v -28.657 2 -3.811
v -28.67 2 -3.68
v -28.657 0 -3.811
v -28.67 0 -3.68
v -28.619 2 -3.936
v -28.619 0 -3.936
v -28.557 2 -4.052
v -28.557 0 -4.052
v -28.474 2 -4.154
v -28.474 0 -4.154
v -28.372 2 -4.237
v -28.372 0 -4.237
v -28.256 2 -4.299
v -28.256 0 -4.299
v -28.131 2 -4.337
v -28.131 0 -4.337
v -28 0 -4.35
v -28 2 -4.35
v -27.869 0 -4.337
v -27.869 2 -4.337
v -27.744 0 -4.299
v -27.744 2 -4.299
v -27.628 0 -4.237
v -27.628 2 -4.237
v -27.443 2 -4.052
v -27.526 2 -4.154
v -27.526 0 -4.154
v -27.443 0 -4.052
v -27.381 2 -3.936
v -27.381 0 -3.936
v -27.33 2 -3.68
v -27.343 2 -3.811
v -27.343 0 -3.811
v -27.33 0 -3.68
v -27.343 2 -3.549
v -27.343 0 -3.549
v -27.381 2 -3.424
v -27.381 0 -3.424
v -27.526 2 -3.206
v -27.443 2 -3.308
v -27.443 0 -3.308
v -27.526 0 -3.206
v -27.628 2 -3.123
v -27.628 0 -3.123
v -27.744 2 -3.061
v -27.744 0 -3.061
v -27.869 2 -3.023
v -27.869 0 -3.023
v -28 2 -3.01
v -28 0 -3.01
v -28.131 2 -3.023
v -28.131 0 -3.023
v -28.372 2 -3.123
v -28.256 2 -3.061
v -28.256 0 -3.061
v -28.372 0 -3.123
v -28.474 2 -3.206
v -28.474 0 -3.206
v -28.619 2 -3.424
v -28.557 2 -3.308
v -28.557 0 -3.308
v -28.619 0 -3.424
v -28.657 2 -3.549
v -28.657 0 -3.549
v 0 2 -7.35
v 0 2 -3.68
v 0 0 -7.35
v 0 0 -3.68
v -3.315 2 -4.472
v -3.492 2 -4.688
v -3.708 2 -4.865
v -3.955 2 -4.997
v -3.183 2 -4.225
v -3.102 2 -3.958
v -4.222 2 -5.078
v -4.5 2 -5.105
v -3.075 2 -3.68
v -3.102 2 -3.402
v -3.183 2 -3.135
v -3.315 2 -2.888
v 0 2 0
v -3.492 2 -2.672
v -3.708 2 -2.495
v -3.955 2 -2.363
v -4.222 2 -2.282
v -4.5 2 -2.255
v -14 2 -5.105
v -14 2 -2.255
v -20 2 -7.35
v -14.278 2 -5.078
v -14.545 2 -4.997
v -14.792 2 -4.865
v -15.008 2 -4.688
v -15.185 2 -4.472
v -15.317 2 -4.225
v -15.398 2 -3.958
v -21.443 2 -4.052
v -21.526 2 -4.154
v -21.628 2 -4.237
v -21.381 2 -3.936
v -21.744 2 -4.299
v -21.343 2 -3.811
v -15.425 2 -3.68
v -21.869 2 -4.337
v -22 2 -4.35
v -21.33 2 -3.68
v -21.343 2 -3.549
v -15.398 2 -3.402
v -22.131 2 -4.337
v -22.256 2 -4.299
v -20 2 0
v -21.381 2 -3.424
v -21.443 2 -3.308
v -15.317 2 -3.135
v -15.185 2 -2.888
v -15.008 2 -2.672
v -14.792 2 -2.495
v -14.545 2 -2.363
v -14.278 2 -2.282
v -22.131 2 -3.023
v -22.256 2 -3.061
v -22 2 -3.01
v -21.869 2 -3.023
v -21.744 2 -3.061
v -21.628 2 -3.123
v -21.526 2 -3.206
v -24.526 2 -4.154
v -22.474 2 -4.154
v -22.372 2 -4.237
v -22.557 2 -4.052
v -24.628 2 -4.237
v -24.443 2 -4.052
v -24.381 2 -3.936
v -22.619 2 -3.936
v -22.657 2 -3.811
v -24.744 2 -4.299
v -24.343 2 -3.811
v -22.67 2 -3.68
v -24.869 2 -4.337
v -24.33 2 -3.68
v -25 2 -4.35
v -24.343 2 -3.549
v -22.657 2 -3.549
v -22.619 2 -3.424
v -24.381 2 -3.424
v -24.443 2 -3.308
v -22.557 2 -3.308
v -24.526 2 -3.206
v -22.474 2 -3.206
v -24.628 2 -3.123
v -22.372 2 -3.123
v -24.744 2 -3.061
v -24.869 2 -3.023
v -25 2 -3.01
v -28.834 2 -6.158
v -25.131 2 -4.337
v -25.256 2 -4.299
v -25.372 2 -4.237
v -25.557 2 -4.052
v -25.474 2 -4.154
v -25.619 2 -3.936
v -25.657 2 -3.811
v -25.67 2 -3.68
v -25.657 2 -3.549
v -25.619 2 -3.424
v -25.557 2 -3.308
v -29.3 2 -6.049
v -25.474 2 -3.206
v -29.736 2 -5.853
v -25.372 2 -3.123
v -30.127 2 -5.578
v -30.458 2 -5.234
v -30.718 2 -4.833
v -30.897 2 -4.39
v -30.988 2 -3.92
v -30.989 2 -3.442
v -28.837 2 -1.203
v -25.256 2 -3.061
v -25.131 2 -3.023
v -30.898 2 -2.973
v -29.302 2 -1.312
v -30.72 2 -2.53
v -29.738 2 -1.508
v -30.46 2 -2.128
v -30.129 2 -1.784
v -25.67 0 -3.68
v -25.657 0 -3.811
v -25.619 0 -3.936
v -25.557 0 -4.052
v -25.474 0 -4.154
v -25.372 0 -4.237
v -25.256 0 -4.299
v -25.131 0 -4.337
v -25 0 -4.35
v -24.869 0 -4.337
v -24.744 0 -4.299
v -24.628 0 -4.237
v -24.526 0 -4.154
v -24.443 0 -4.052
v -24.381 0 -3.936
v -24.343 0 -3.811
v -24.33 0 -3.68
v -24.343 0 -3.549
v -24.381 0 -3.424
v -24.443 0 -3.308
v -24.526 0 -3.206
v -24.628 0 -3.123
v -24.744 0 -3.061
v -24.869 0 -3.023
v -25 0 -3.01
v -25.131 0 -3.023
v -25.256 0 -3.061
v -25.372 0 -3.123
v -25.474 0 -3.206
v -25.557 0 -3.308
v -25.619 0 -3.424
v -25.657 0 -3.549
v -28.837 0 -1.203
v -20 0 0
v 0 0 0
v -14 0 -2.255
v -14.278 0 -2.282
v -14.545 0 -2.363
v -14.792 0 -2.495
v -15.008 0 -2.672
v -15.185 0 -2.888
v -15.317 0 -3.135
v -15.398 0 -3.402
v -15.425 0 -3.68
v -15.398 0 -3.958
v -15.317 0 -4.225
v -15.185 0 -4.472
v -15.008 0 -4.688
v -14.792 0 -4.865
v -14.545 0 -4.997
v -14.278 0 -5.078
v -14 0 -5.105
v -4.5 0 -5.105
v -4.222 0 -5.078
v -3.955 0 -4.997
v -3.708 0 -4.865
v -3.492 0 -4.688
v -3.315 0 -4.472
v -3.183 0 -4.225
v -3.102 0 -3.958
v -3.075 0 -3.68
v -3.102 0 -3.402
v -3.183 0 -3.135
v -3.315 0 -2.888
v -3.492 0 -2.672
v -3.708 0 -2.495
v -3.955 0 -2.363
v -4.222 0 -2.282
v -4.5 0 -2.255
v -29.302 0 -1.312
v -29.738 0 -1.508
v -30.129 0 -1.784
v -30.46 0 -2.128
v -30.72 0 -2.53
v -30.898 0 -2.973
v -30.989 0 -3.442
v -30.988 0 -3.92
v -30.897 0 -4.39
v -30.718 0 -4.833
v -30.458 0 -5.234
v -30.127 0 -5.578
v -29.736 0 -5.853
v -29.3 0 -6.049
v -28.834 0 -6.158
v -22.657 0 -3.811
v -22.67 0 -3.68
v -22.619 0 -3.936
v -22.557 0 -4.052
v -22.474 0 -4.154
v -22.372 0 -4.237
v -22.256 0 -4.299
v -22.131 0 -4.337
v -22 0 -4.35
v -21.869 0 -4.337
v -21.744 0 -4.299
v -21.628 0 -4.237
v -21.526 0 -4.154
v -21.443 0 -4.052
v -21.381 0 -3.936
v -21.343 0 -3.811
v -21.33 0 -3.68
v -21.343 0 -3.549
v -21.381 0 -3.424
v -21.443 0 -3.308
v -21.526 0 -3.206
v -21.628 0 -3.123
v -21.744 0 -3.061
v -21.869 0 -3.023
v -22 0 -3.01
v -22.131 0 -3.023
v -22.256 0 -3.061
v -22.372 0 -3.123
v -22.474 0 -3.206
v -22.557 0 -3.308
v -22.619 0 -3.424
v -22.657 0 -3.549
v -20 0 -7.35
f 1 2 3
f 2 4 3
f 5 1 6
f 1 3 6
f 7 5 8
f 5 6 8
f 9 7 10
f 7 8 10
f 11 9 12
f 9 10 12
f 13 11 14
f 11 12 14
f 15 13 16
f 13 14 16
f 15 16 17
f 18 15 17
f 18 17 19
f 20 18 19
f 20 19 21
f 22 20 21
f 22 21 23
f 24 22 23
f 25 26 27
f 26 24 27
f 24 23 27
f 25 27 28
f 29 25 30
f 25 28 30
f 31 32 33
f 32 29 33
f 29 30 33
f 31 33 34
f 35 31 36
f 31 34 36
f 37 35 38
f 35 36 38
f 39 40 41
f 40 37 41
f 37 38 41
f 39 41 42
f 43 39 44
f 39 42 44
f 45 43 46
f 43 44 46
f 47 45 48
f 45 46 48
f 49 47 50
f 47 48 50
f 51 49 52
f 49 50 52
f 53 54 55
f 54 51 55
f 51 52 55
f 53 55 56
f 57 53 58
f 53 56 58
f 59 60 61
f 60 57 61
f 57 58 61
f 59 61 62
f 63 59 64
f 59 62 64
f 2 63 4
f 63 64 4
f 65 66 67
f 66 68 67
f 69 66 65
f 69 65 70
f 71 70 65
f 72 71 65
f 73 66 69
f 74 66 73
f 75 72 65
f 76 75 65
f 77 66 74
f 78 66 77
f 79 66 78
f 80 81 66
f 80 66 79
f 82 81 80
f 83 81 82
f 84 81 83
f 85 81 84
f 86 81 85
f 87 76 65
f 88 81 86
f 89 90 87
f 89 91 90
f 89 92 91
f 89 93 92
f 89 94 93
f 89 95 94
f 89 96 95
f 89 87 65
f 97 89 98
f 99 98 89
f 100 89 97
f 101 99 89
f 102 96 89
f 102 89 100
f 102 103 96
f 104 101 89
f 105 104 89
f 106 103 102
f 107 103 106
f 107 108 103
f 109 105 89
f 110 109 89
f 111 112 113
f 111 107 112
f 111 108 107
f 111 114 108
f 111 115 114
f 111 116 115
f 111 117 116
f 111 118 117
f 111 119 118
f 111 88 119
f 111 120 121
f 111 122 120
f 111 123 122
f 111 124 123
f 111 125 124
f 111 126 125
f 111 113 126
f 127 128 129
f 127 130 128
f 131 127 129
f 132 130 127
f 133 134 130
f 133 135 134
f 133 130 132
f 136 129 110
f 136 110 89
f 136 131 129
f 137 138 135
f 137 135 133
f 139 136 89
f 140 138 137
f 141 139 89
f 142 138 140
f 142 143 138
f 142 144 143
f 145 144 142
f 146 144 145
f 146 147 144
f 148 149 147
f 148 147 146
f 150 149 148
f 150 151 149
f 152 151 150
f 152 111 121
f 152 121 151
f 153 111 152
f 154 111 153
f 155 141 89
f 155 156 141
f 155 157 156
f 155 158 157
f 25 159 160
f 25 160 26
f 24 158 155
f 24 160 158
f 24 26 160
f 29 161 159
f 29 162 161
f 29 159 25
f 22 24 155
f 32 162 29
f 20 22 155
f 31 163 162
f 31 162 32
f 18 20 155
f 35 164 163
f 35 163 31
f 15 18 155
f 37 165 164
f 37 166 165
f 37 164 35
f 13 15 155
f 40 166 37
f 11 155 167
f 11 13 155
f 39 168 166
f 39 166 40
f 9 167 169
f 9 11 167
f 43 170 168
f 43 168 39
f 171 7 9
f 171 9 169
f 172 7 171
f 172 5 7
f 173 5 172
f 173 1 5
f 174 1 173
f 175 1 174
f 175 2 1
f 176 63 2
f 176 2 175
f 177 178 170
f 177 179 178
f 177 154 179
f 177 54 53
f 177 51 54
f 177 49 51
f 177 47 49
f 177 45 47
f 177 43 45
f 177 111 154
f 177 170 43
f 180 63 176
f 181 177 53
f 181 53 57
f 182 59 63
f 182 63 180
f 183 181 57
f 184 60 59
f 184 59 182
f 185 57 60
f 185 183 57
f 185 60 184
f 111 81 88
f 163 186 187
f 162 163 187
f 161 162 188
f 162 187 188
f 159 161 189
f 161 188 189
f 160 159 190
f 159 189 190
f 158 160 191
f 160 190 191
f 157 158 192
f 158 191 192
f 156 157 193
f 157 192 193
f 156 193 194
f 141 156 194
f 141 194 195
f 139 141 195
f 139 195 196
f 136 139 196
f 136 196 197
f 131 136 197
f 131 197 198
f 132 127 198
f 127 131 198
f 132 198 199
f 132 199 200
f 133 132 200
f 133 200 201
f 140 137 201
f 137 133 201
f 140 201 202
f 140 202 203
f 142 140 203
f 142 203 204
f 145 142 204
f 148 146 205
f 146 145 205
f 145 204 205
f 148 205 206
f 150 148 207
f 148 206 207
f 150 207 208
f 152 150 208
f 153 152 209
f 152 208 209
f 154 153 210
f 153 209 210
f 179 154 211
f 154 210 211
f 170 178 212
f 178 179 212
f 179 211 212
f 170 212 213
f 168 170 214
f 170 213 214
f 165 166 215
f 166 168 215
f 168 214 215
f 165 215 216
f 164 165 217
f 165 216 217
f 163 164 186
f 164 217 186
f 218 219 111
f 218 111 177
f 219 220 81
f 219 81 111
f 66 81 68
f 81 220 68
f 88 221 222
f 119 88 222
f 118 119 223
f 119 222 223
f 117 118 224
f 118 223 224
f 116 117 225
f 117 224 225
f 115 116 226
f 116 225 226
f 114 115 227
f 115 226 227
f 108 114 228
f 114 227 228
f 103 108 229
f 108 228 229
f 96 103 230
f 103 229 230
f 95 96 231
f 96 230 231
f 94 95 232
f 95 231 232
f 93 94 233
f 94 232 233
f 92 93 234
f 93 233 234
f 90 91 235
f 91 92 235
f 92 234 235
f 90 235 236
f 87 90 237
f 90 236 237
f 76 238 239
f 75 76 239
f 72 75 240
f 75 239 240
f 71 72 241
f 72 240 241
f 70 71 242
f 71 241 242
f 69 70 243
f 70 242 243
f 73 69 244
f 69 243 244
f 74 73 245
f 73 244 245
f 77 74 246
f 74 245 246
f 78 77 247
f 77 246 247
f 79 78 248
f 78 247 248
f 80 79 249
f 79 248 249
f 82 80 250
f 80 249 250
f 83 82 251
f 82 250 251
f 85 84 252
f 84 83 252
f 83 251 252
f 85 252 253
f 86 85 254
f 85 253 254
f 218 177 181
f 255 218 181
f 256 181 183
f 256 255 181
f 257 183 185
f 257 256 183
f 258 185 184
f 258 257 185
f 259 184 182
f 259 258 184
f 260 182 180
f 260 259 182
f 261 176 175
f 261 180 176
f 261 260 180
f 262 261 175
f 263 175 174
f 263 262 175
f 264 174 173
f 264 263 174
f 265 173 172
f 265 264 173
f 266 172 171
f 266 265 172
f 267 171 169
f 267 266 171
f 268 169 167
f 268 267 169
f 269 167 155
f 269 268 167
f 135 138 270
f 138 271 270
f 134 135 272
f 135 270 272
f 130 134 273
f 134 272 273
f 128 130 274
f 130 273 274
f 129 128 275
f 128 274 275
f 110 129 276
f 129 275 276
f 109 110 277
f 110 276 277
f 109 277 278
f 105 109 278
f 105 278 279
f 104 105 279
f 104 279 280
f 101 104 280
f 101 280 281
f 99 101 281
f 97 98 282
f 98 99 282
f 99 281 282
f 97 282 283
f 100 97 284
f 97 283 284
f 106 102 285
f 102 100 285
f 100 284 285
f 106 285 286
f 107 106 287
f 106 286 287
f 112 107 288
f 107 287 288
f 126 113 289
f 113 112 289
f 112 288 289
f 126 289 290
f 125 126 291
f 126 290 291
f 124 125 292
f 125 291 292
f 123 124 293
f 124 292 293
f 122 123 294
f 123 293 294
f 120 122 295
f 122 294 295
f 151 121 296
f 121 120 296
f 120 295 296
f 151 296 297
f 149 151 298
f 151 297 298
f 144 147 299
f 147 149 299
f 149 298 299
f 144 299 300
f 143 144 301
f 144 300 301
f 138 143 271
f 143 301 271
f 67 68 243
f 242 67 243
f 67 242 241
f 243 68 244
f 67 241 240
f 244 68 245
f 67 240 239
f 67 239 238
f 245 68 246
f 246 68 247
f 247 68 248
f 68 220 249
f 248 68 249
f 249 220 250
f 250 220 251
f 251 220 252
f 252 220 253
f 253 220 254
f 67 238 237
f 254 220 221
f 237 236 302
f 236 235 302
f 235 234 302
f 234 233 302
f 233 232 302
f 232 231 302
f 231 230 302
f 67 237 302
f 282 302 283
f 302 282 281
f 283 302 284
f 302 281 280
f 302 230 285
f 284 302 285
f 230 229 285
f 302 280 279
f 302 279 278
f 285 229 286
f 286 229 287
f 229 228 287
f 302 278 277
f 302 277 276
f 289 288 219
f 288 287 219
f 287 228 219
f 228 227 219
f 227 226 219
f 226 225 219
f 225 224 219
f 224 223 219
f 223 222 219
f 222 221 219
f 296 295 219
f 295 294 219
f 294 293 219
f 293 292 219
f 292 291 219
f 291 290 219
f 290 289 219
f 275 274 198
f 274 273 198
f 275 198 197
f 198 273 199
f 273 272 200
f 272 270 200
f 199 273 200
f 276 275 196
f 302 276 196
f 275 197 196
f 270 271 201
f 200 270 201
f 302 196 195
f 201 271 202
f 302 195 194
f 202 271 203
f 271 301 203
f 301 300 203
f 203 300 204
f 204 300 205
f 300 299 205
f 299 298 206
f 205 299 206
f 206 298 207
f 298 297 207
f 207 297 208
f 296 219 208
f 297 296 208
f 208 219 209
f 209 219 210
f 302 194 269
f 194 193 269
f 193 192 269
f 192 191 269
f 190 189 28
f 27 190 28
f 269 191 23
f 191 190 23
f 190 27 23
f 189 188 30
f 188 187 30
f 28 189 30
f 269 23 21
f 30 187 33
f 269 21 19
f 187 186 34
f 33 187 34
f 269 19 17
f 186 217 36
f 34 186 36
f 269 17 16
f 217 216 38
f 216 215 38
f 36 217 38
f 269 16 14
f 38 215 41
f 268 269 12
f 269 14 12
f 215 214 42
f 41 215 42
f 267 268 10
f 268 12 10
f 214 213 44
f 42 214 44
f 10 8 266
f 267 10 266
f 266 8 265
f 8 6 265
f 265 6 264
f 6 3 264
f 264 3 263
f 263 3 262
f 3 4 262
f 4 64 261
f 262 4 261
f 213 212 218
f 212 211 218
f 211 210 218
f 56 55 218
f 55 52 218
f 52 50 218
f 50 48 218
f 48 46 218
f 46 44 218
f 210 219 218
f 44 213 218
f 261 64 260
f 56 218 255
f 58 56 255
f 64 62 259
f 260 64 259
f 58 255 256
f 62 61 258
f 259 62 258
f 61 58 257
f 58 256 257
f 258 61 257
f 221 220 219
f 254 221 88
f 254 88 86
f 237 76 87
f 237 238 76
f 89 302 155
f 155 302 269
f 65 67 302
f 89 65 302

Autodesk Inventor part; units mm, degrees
ref_plane "YZ Plane" through (0, 0, 0) normal (1, 0, 0) x (0, 1, 0)
ref_plane "XZ Plane" through (0, 0, 0) normal (0, 1, 0) x (-1, 0, 0)
ref_plane "XY Plane" through (0, 0, 0) normal (0, 0, 1) x (1, 0, 0)
sketch "Sketch1" plane through (0, 0, 0) normal (0, 1, 0) x (-1, 0, 0)
  line L0 (0, 0) -> (0, -7.35)
  line L1 (0, -7.35) -> (20, -7.35)
  line L2 (0, 0) -> (20, 0)
  line L3 (0, 0) -> (0, -3.68)
  line L4 (0, -3.68) -> (4.5, -3.68) construction
  line L5 (4.5, -3.68) -> (14, -3.68) construction
  line L6 (14, -3.68) -> (22, -3.68) construction
  line L7 (22, -3.68) -> (25, -3.68) construction
  line L8 (25, -3.68) -> (28, -3.68) construction
  line L9 (28, -3.68) -> (28.5, -3.68) construction
  arc A0 (28.8344, -6.1575) -> (28.8372, -1.2028) centre (28.5, -3.68) ccw
  circle A1 centre (28, -3.68) radius 0.67
  circle A2 centre (25, -3.68) radius 0.67
  circle A3 centre (22, -3.68) radius 0.67
  line L10 (20, 0) -> (28.8372, -1.2028)
  line L11 (20, -7.35) -> (28.8344, -6.1575)
  arc A4 (4.5, -2.255) -> (4.5, -5.105) centre (4.5, -3.68) ccw
  arc A5 (14, -5.105) -> (14, -2.255) centre (14, -3.68) ccw
  line L12 (14, -2.255) -> (4.5, -2.255)
  line L13 (4.5, -5.105) -> (14, -5.105)
  dimension "d0" = 7.35
  dimension "d1" = 20
  dimension "d2" = 20
  dimension "d3" = 3.68
  dimension "d4" = 4.5
  dimension "d5" = 9.5
  dimension "d6" = 8
  dimension "d7" = 3
  dimension "d8" = 3
  dimension "d9" = 0.5
  dimension "d10" = 5
  dimension "d11" = 1.34
  dimension "d12" = 1.34
  dimension "d13" = 1.34
  dimension "d16" = 2.85
  dimension "d17" = 2.85
extrude "Extrusion1" add sketch "Sketch1" along normal blind 2
properties part number "MMAE 232 CAD Assignment 2 Servo Horn 1-Nicholas Skiba"
